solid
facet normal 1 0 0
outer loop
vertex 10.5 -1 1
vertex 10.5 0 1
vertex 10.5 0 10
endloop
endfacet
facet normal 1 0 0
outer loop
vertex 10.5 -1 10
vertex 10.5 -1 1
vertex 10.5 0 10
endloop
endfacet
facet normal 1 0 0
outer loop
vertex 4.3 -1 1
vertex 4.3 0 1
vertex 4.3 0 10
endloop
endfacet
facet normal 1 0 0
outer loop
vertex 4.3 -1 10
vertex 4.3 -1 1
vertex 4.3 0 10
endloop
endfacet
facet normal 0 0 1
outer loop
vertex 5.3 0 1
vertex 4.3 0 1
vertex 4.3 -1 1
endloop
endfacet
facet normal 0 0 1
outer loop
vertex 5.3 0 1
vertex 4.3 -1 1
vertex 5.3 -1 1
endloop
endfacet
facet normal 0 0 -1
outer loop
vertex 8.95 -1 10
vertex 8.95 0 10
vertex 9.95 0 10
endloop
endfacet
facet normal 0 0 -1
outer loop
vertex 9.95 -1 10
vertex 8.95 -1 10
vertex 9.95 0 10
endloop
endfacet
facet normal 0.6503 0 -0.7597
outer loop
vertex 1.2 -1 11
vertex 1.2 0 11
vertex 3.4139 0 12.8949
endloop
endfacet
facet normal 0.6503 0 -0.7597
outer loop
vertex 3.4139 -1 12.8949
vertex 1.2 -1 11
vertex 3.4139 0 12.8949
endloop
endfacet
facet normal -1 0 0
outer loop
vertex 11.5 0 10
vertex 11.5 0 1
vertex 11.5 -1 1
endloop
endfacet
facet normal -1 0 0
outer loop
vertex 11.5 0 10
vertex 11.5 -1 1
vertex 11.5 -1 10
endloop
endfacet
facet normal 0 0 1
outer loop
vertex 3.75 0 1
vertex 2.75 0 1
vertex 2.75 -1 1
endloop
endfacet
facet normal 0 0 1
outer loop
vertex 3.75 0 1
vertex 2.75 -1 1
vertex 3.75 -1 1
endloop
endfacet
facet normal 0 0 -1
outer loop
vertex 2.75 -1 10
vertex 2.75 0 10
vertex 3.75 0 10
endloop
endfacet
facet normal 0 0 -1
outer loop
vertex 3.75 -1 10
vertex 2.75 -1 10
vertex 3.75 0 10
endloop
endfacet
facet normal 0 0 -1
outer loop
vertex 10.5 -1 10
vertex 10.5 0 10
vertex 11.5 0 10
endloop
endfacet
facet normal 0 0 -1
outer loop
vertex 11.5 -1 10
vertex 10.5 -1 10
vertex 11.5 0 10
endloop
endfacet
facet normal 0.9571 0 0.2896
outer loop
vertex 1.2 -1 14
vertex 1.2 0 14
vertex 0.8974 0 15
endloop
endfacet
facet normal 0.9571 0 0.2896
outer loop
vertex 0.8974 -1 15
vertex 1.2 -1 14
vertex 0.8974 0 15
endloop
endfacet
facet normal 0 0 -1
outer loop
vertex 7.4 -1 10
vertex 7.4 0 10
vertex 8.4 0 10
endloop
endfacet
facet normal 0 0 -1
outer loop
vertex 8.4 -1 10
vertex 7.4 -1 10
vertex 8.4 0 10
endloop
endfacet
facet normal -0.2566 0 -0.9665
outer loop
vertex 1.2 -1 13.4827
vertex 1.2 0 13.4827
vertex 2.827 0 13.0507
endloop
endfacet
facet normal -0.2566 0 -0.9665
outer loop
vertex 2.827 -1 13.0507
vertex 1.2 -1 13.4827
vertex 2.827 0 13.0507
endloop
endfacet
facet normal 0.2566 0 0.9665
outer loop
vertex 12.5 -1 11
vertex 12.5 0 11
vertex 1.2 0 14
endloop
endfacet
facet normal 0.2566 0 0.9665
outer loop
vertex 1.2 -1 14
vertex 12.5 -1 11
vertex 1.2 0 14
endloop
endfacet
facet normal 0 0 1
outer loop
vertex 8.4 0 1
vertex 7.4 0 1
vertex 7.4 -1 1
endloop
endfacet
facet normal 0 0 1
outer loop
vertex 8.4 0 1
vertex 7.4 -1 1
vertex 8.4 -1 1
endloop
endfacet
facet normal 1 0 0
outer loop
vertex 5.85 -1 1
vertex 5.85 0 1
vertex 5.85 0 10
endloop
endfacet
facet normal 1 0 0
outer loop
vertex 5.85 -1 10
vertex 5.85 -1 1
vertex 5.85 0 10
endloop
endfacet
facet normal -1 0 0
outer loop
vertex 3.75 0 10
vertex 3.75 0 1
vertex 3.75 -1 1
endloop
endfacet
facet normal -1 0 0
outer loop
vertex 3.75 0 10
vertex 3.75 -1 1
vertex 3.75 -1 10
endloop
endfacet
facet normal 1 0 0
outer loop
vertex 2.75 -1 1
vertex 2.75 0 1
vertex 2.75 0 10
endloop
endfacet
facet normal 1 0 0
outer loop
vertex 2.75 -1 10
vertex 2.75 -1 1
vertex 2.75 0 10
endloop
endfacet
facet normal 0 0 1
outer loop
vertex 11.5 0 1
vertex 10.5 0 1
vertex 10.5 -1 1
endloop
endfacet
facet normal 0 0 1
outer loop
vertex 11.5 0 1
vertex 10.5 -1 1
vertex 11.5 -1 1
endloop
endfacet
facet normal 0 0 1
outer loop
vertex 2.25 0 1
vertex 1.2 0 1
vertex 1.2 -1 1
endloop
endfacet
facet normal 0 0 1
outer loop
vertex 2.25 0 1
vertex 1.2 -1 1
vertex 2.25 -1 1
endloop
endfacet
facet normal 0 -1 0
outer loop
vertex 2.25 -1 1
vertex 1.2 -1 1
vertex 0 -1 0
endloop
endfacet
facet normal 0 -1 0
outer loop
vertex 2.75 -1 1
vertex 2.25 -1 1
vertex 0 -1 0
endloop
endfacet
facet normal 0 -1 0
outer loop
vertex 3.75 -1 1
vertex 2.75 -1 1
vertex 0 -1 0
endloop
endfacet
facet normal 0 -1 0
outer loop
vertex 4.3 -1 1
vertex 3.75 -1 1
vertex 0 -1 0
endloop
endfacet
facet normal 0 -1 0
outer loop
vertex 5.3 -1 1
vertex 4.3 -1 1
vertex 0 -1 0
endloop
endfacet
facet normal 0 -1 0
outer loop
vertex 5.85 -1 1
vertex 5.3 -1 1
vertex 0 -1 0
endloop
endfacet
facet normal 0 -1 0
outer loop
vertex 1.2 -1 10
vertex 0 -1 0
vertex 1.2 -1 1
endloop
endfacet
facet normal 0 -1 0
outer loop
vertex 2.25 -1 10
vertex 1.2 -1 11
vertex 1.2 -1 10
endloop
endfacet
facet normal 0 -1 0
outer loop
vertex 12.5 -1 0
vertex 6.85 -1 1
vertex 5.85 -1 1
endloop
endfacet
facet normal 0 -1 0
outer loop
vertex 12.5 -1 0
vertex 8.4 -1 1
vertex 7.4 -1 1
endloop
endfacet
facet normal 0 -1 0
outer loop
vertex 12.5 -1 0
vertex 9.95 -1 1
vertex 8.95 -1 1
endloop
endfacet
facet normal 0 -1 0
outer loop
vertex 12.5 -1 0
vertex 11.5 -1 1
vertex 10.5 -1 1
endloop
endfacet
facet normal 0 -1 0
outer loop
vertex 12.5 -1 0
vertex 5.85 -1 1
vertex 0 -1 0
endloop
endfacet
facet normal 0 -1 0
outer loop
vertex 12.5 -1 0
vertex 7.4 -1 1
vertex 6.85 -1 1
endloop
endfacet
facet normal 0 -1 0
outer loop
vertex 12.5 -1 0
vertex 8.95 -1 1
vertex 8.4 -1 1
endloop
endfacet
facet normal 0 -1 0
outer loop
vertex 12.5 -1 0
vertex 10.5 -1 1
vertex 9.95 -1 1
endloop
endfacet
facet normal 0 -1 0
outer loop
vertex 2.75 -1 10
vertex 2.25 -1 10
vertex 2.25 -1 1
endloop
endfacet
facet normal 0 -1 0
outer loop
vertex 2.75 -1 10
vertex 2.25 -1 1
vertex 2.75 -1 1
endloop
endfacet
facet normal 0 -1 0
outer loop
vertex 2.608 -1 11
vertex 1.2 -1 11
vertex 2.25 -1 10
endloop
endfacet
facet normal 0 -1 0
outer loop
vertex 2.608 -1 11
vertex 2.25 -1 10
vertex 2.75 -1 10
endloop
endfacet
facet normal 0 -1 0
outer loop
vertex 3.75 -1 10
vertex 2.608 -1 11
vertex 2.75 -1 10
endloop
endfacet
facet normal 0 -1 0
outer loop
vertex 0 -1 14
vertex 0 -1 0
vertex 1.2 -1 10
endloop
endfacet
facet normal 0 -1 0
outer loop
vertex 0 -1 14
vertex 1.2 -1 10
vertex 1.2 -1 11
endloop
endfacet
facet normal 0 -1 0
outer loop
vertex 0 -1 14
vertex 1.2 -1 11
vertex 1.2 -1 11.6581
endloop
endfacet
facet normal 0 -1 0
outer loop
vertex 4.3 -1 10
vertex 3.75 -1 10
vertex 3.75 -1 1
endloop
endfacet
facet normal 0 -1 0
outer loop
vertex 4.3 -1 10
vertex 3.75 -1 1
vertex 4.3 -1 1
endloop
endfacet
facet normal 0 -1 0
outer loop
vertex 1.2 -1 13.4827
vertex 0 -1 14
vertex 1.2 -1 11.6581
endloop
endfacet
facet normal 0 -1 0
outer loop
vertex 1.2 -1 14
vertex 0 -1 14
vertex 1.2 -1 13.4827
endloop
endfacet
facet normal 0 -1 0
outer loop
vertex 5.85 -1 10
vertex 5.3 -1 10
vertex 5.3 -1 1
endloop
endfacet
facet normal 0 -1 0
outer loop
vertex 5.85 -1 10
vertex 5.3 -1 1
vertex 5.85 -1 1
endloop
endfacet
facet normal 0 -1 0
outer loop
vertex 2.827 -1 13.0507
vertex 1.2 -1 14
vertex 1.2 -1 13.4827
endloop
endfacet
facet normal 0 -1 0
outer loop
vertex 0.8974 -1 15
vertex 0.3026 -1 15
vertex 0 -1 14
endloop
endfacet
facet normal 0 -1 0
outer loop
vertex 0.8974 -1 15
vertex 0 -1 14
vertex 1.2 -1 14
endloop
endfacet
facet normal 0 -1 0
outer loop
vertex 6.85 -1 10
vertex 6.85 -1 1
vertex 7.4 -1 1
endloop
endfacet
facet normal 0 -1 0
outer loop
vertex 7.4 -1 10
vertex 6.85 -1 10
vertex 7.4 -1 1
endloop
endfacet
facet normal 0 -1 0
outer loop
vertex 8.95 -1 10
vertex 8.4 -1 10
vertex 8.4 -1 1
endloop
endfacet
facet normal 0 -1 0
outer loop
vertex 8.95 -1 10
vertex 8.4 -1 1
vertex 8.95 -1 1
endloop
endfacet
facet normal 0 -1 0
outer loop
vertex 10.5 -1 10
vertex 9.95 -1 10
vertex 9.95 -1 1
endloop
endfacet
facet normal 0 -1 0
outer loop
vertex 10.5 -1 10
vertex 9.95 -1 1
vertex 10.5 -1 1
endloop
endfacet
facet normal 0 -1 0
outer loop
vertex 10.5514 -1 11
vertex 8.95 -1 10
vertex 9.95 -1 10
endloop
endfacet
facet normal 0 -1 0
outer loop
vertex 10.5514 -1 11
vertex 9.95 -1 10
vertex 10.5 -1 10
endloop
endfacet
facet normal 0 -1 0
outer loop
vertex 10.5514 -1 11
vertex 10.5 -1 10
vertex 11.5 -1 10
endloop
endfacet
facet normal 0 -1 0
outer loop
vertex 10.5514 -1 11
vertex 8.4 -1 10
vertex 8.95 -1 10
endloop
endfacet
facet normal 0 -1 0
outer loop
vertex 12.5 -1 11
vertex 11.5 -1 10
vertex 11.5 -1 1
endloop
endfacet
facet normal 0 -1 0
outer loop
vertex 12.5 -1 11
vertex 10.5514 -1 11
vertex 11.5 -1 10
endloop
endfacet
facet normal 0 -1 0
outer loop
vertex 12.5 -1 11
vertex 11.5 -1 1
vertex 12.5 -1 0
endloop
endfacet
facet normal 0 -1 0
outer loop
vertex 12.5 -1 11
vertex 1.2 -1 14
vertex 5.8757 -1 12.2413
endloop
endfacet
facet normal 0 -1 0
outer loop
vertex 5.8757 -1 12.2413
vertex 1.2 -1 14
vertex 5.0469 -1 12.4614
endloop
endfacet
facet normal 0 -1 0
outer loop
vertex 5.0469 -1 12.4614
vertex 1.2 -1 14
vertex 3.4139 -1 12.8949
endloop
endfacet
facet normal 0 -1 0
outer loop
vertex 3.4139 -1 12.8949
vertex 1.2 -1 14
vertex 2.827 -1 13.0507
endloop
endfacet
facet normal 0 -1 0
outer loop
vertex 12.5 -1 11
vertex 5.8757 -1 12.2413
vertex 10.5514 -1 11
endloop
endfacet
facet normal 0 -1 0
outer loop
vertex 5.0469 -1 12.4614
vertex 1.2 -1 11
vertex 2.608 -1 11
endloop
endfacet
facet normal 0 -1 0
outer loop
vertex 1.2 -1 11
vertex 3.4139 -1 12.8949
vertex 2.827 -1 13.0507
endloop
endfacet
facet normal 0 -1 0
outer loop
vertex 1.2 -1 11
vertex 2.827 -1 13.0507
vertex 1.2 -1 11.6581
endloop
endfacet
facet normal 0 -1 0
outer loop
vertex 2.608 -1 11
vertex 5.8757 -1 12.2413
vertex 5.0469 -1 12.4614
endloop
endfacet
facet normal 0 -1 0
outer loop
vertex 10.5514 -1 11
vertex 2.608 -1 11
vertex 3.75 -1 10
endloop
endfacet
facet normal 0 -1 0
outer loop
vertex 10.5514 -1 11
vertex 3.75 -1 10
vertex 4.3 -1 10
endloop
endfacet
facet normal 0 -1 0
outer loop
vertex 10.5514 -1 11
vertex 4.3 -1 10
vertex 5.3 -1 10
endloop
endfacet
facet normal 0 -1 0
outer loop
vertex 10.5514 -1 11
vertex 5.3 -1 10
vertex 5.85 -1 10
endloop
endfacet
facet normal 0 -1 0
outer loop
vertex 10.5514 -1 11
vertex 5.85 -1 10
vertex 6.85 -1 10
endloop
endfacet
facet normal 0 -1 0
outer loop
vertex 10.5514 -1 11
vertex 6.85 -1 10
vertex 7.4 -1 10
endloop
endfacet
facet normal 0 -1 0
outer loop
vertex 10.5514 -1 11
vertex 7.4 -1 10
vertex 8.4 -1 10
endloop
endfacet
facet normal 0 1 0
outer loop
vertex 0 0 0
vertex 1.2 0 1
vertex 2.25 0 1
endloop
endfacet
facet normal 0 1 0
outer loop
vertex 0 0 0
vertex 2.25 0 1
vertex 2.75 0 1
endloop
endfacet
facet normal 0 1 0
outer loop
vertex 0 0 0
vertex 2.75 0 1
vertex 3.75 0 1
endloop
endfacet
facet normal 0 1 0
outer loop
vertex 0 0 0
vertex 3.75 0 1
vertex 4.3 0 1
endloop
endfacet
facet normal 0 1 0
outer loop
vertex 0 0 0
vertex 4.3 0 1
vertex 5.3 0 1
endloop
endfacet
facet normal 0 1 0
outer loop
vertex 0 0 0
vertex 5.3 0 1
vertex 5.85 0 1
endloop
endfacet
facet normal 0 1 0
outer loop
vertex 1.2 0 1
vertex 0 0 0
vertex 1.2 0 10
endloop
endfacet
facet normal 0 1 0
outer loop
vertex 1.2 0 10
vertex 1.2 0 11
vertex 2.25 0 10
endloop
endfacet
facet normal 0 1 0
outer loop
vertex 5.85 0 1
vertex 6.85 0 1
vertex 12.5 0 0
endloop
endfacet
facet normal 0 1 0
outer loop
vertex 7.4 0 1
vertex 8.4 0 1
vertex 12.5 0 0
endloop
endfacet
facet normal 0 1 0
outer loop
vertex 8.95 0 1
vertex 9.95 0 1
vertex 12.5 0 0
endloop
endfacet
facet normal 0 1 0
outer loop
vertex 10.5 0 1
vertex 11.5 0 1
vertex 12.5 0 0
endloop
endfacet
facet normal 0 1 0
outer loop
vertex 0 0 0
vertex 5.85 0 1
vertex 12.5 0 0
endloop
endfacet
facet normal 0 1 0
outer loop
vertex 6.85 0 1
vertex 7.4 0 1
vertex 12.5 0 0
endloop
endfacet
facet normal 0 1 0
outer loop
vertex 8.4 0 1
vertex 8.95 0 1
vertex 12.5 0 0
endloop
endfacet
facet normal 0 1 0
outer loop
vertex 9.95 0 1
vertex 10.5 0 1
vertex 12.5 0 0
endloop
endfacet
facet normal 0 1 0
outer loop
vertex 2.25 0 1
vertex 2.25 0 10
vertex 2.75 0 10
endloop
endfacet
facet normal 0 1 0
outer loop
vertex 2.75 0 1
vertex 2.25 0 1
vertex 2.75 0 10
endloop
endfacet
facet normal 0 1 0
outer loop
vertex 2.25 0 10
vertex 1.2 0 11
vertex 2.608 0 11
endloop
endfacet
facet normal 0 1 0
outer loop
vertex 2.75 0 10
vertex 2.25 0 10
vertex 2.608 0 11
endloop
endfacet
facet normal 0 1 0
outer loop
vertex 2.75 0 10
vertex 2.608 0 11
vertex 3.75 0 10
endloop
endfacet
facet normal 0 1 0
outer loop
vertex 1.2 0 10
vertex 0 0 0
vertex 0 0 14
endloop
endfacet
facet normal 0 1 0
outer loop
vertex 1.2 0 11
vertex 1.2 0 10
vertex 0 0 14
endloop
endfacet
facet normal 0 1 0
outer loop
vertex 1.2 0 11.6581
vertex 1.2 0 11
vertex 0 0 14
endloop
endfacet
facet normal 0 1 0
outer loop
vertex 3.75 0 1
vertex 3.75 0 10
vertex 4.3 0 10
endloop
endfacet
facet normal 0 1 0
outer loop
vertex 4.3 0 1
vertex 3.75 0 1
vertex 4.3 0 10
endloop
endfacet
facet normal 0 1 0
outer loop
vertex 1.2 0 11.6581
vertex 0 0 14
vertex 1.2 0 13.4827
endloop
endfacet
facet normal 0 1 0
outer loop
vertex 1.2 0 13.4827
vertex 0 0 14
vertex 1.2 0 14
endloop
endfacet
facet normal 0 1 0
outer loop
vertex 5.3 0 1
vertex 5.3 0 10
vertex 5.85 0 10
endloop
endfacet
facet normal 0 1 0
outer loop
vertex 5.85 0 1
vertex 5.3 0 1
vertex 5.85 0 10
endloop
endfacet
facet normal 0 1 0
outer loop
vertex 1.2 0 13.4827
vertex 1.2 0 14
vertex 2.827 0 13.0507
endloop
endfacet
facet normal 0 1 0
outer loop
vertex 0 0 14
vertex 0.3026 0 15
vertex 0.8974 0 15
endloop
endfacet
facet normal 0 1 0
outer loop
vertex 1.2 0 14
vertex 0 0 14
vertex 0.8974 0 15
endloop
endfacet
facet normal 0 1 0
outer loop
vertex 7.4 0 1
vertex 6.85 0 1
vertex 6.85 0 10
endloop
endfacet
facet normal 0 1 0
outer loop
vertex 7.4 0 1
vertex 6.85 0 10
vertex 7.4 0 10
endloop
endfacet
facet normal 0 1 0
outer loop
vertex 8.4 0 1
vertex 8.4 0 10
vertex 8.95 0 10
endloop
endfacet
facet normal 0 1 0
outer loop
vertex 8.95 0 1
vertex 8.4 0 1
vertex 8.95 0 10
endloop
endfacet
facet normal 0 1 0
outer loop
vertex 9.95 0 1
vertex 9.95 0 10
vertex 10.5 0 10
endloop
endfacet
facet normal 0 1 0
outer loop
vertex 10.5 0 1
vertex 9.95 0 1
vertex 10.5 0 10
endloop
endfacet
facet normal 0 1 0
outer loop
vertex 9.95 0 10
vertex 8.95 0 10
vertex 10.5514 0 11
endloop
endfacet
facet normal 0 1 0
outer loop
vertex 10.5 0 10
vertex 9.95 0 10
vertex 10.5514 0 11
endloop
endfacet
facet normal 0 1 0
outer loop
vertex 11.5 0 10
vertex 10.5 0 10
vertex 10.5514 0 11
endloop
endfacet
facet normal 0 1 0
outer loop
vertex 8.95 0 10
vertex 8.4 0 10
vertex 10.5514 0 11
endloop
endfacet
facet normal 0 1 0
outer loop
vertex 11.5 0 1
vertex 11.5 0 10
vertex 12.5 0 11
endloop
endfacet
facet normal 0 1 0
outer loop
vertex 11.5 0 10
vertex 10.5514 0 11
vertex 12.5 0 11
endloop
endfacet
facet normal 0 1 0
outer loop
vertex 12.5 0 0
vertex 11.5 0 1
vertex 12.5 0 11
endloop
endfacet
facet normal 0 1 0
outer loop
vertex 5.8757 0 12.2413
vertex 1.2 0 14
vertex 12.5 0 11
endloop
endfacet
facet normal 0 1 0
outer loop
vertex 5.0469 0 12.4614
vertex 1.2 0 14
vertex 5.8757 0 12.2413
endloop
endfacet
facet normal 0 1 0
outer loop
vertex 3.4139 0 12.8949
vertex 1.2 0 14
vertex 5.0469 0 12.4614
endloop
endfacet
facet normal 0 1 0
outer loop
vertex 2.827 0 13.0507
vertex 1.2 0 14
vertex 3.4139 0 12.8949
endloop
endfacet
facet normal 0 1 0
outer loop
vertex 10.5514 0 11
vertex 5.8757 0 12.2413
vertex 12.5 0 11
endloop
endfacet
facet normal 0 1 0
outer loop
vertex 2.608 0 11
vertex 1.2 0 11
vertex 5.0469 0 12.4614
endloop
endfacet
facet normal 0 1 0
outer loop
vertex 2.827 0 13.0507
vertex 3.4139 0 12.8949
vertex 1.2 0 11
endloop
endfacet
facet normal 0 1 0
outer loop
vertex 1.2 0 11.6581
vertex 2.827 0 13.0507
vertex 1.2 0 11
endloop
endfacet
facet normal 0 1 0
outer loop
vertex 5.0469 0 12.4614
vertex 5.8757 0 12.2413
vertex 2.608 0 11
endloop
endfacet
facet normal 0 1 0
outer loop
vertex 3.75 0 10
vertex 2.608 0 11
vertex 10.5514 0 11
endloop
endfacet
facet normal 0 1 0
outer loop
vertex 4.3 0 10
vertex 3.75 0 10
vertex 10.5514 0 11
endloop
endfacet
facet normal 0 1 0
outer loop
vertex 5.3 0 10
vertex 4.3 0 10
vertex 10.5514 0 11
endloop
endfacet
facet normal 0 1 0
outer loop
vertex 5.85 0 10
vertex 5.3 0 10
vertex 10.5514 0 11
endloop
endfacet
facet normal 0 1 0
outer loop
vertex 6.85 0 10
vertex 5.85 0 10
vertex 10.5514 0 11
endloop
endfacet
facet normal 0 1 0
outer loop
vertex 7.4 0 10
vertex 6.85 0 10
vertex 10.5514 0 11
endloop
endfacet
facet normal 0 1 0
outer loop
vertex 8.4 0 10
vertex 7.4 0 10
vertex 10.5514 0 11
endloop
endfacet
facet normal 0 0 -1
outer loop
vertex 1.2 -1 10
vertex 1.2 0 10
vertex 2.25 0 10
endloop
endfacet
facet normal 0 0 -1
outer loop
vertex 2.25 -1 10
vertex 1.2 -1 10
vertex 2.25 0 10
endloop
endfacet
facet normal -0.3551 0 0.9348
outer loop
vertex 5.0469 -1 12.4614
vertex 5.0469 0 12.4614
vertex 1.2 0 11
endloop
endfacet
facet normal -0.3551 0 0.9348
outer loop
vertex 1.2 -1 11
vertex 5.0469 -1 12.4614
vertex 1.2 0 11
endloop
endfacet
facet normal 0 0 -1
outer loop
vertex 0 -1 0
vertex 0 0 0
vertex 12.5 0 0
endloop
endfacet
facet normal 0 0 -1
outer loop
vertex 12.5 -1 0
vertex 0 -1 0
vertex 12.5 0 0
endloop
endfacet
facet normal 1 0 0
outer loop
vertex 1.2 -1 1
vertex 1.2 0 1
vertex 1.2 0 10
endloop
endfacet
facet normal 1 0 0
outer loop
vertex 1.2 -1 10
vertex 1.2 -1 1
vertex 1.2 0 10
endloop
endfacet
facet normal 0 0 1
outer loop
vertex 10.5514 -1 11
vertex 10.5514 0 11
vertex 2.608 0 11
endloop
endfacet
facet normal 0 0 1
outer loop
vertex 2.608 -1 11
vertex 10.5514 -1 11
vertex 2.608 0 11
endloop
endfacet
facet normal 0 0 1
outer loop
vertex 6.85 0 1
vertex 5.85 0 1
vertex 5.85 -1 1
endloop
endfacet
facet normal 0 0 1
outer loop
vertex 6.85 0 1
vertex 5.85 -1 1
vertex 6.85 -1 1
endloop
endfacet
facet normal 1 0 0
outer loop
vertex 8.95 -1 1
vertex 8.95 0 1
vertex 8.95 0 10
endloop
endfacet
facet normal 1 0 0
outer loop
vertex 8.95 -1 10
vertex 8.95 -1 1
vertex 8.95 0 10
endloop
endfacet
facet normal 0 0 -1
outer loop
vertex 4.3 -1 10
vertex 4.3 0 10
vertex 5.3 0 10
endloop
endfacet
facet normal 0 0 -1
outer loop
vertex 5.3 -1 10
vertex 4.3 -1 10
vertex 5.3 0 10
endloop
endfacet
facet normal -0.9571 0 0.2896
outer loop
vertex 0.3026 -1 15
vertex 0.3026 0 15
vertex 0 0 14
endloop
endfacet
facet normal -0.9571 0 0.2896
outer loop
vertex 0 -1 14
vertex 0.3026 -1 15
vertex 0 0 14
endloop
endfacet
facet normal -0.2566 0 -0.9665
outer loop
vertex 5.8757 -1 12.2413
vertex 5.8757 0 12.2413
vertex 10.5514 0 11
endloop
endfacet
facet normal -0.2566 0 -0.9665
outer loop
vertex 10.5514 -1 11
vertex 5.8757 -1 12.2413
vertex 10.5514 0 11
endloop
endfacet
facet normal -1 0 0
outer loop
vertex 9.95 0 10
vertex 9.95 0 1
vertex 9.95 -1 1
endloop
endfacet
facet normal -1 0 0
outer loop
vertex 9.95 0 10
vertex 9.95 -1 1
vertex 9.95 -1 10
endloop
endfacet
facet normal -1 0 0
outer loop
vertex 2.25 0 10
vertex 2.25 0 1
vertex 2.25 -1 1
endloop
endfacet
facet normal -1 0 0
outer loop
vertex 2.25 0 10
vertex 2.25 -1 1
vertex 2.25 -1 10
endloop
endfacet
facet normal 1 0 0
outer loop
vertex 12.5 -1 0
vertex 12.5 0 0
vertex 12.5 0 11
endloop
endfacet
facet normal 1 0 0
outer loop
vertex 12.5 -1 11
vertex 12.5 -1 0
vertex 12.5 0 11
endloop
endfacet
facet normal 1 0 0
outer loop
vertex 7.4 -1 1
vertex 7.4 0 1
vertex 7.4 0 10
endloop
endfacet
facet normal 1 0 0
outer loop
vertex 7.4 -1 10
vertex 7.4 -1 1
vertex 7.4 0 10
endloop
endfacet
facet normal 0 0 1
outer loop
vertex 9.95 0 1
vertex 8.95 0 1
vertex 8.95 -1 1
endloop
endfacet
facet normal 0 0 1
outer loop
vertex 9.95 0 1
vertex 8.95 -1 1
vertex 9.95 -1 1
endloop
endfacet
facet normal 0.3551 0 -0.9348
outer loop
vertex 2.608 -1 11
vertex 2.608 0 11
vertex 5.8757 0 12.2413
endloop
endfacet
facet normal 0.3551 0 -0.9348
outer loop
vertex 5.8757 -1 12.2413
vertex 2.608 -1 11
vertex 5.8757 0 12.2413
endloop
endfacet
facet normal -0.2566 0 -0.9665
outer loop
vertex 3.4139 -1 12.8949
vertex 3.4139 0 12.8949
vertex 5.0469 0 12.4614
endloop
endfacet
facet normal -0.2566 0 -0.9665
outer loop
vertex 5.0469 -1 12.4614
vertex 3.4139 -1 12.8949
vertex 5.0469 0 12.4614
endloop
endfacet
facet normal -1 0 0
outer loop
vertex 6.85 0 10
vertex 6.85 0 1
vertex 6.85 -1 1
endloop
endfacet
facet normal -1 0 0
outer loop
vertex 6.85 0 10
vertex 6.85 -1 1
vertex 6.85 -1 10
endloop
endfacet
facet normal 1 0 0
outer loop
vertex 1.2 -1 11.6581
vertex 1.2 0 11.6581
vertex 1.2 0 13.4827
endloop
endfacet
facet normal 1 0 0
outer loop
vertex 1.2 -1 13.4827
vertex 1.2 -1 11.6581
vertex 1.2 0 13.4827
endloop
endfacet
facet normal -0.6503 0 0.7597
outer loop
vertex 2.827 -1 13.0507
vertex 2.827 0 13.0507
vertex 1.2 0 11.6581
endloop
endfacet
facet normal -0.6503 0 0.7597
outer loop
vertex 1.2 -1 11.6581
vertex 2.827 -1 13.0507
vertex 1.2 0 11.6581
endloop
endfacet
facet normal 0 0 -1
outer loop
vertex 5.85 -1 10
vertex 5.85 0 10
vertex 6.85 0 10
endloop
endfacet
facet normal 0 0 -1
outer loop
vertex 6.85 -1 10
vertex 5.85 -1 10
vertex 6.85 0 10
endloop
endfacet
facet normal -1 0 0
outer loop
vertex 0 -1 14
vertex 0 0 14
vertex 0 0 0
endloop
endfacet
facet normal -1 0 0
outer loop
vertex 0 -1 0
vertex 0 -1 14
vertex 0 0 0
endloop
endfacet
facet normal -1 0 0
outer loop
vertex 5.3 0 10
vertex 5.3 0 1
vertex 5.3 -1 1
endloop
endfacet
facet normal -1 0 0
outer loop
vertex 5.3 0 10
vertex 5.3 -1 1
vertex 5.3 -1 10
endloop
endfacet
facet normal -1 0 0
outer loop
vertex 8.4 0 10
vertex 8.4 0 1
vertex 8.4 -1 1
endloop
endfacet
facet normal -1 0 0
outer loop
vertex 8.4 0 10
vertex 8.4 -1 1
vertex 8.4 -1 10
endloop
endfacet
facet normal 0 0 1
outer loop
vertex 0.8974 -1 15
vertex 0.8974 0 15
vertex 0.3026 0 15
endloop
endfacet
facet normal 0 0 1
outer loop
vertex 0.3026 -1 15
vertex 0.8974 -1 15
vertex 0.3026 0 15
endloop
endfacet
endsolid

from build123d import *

# Parameters (mm, degrees)
F0_W     = 1.05
F0_H     = 9
F0_W_2   = 1
F1_DEPTH = 1


with BuildPart() as f1:
    # F0 (on Front) → F1 (new body)
    with BuildSketch(Plane.XZ):
        Polygon((0, 14), (0, 0), (12.5, 0), (12.5, 11), (1.2, 14), (0.897396, 15), (0.302604, 15), align=None)
        with Locations((1.725, 5.5)):
            Rectangle(F0_W, F0_H, mode=Mode.SUBTRACT)
        with Locations((3.25, 5.5)):
            Rectangle(F0_W_2, F0_H, mode=Mode.SUBTRACT)
        with Locations((4.8, 5.5)):
            Rectangle(F0_W_2, F0_H, mode=Mode.SUBTRACT)
        with Locations((6.35, 5.5)):
            Rectangle(F0_W_2, F0_H, mode=Mode.SUBTRACT)
        with Locations((7.9, 5.5)):
            Rectangle(F0_W_2, F0_H, mode=Mode.SUBTRACT)
        with Locations((9.45, 5.5)):
            Rectangle(F0_W_2, F0_H, mode=Mode.SUBTRACT)
        with Locations((11, 5.5)):
            Rectangle(F0_W_2, F0_H, mode=Mode.SUBTRACT)
        Polygon((5.046939, 12.461368), (1.2, 11), (3.413901, 12.894918), align=None, mode=Mode.SUBTRACT)
        Polygon((1.2, 11.65814), (1.2, 13.482679), (2.827012, 13.050729), align=None, mode=Mode.SUBTRACT)
        Polygon((5.875713, 12.24134), (10.551425, 11), (2.607982, 11), align=None, mode=Mode.SUBTRACT)
    extrude(amount=F1_DEPTH)


solid = f1.part
